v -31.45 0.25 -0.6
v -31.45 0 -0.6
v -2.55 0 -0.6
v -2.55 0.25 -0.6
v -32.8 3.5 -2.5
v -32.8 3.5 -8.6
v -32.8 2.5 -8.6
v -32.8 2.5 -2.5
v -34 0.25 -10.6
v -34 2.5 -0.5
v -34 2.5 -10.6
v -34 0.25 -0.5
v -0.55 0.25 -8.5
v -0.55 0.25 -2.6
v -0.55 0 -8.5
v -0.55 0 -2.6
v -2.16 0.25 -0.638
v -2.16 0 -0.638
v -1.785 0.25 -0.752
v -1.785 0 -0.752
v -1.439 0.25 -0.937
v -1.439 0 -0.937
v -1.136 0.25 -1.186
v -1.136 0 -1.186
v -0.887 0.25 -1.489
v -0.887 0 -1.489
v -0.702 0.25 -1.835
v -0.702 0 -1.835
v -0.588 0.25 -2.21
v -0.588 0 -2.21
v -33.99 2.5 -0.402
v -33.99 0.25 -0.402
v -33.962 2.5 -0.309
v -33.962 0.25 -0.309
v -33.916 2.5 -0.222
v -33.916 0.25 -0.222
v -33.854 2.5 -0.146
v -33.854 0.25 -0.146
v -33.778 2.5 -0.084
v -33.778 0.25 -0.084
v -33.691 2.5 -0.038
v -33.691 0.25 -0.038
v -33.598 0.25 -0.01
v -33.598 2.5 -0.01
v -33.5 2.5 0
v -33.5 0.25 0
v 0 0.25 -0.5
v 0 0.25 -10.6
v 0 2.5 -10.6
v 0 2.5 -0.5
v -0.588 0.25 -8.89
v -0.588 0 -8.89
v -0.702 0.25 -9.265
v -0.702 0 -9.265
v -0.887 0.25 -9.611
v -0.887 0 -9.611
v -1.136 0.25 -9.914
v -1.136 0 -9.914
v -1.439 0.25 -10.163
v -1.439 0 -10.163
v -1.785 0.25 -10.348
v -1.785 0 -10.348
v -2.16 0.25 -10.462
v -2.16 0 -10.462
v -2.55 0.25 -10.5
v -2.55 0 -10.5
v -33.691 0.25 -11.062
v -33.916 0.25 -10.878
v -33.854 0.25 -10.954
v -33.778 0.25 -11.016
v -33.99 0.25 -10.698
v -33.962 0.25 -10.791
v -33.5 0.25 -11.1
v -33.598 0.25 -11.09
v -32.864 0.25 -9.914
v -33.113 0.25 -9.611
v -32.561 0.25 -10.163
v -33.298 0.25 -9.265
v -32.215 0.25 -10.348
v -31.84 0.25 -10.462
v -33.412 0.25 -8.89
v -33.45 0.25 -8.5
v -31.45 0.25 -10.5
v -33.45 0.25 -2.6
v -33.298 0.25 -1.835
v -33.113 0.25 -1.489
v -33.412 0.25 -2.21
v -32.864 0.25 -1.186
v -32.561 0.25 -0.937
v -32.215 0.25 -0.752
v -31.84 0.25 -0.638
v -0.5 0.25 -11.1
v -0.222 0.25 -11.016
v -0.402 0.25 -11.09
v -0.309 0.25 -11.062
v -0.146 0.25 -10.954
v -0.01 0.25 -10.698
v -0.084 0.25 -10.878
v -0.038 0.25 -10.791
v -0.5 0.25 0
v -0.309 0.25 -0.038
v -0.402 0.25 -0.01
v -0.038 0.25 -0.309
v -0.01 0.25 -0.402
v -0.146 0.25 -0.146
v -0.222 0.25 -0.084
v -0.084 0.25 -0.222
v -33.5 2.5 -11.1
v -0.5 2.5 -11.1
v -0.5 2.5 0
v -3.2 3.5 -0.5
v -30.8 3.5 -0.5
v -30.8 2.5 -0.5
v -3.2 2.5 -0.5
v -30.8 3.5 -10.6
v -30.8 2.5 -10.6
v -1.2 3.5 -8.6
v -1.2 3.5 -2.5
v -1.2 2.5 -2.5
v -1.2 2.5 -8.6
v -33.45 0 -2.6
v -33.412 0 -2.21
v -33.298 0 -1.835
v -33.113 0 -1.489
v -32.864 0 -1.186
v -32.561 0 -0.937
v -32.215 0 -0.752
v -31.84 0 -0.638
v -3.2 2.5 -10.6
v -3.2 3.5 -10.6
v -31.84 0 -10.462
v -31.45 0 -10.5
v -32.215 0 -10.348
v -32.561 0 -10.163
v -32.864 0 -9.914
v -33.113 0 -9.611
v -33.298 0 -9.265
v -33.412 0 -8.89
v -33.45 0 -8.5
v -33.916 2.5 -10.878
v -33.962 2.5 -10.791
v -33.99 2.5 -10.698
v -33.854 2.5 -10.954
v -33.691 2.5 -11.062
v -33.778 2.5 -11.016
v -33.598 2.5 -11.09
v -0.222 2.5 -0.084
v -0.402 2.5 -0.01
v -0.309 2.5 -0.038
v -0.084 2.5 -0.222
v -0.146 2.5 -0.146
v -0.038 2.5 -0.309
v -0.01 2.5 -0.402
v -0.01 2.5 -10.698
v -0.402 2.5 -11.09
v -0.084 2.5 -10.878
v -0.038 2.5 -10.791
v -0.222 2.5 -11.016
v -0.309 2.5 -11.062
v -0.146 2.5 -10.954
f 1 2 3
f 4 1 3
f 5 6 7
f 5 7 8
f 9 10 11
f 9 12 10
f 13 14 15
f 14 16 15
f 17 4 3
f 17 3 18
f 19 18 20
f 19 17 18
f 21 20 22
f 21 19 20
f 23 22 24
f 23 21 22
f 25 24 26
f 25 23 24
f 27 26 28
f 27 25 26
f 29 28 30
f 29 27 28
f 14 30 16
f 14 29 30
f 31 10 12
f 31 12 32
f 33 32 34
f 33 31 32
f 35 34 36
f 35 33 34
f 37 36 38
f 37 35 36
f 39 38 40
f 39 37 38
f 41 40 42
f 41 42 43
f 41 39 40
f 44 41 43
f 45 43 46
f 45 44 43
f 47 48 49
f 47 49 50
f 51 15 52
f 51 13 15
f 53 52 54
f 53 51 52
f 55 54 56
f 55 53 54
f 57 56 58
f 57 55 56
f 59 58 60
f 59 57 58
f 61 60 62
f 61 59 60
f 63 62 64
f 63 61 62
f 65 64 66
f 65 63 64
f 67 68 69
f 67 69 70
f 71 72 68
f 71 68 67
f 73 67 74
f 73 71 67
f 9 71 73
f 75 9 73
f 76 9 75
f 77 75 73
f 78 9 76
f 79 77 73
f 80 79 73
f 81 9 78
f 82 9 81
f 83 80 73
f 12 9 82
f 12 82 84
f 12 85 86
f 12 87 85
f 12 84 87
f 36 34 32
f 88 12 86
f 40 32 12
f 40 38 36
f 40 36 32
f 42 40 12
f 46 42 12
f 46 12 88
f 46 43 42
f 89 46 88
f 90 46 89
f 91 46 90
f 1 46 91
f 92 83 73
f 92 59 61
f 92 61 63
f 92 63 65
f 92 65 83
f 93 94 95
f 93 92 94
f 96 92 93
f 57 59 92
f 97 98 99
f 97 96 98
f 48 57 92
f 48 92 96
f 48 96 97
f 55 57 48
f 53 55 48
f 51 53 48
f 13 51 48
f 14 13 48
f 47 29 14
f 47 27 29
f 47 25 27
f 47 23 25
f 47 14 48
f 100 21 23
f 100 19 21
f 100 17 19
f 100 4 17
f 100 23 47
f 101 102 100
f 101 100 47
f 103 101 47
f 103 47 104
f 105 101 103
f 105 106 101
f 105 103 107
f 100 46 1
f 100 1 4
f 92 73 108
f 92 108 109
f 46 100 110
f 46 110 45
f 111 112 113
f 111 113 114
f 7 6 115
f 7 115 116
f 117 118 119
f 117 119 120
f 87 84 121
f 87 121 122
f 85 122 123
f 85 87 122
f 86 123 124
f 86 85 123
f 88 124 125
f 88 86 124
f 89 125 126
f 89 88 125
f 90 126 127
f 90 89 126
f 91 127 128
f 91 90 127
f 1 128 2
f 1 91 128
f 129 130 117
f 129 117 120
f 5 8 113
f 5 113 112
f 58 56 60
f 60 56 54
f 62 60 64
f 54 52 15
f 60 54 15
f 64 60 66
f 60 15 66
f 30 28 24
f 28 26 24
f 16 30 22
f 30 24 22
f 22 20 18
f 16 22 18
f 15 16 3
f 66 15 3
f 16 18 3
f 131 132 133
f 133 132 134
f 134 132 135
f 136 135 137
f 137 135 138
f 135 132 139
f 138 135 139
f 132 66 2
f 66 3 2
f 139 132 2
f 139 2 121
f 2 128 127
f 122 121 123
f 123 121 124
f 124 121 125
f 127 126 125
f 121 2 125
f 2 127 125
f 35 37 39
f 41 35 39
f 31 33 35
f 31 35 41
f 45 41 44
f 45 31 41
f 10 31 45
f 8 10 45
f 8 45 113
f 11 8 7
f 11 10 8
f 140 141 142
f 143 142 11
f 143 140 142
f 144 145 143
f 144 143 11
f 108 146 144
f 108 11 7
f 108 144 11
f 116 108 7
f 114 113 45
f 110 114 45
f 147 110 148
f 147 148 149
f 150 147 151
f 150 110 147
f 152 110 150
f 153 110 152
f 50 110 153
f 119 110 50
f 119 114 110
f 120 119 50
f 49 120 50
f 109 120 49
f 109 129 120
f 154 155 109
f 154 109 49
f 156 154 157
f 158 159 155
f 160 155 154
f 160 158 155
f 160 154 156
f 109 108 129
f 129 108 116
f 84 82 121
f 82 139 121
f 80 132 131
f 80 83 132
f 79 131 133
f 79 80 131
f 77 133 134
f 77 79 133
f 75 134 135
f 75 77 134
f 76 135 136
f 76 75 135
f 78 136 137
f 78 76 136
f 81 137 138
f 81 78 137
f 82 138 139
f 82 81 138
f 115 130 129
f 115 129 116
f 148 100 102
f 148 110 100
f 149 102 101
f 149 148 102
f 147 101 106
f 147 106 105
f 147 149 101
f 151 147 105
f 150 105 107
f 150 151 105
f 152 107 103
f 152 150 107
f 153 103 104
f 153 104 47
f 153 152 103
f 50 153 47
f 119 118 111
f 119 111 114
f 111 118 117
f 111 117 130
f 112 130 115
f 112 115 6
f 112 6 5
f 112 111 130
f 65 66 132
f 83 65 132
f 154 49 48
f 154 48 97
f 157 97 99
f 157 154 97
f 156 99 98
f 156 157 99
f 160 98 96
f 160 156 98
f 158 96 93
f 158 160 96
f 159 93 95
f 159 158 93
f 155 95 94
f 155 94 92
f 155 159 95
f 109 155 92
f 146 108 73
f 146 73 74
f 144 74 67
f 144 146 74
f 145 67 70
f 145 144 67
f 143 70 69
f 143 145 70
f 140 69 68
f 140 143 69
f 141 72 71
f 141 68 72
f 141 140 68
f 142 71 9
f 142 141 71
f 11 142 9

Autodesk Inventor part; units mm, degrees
ref_plane "YZ Plane" through (0, 0, 0) normal (1, 0, 0) x (0, 1, 0)
ref_plane "XZ Plane" through (0, 0, 0) normal (0, 1, 0) x (-1, 0, 0)
ref_plane "XY Plane" through (0, 0, 0) normal (0, 0, 1) x (1, 0, 0)
sketch "Sketch1" plane through (0, 0, 0) normal (0, 1, 0) x (-1, 0, 0)
  line L0 (0, 0) -> (34, 0)
  line L1 (34, 0) -> (34, -11.1)
  line L2 (34, -11.1) -> (0, -11.1)
  line L3 (0, -11.1) -> (0, 0)
  dimension "d0" = 34
  dimension "d1" = 11.1
extrude "Extrusion1" add sketch "Sketch1" along normal blind 3.5
sketch "Sketch2" plane through (0, 3.5, 0) normal (0, 1, 0) x (1, 0, 0)
  line L0 (-32.8, 0.5) -> (-1.2, 0.5)
  line L1 (-1.2, 0.5) -> (-1.2, 10.6)
  line L2 (-1.2, 10.6) -> (-32.8, 10.6)
  line L3 (-32.8, 10.6) -> (-32.8, 0.5)
  line L4 (-34, 11.1) -> (-34, 0) projected
  line L5 (0, 0) -> (0, 11.1) projected
  line L6 (0, 11.1) -> (-34, 11.1) projected
  line L7 (-34, 0) -> (0, 0) projected
  dimension "d4" = 1.2
  dimension "d5" = 1.2
  dimension "d6" = 0.5
  dimension "d7" = 0.5
extrude "Extrusion2" cut sketch "Sketch2" against normal blind 1
sketch "Sketch3" plane through (0, 0, 0) normal (0, -1, 0) x (1, 0, 0)
  line L0 (-0.55, -10.5) -> (-33.45, -10.5)
  line L1 (-33.45, -10.5) -> (-33.45, -0.6)
  line L2 (-33.45, -0.6) -> (-0.55, -0.6)
  line L3 (-0.55, -0.6) -> (-0.55, -10.5)
  line L4 (-0.55, -10.5) -> (-33.45, -0.6) construction
  line L5 (-33.45, -10.5) -> (-0.55, -0.6) construction
  line L6 (-17, -5.55) -> (-17, -7.3465)
  line L7 (-17, -7.3465) -> (-17, -5.55)
  line L8 (-22.3316, -5.55) -> (-22.3865, -5.55)
  line L9 (-22.3865, -5.55) -> (-17, -5.55)
  line L10 (-34, -11.1) -> (-34, 0) projected
  line L11 (0, -11.1) -> (-34, -11.1) projected
  line L12 (0, -11.1) -> (-34, -11.1) projected
  line L13 (0, 0) -> (0, -11.1) projected
  line L14 (-34, 0) -> (0, 0) projected
  line L15 (-34, -11.1) -> (-34, 0) projected
  point P0 (-34, -5.55)
  point P1 (-17, -11.1)
  dimension "d10" = 32.9
  dimension "d11" = 9.9
extrude "Extrusion3" cut sketch "Sketch3" against normal blind 0.25
fillet "Fillet1" radius 2 4 edges at (-33.45, 0.125, -10.5) (-33.45, 0.125, -0.6) (-0.55, 0.125, -0.6) (-0.55, 0.125, -10.5)
fillet "Fillet2" radius 0.5 4 edges at (-34, 1.375, 0) (-34, 1.375, -11.1) (0, 1.375, 0) (0, 1.375, -11.1)
chamfer "Chamfer1" distance 2 angle 45 4 edges at (-1.2, 3, -0.5) (-1.2, 3, -10.6) (-32.8, 3, -0.5) (-32.8, 3, -10.6)
equation "\"d5\" = d4"
equation "\"d7\" = d6"
properties part number "Speka" material "Acetal Resin, Black"
